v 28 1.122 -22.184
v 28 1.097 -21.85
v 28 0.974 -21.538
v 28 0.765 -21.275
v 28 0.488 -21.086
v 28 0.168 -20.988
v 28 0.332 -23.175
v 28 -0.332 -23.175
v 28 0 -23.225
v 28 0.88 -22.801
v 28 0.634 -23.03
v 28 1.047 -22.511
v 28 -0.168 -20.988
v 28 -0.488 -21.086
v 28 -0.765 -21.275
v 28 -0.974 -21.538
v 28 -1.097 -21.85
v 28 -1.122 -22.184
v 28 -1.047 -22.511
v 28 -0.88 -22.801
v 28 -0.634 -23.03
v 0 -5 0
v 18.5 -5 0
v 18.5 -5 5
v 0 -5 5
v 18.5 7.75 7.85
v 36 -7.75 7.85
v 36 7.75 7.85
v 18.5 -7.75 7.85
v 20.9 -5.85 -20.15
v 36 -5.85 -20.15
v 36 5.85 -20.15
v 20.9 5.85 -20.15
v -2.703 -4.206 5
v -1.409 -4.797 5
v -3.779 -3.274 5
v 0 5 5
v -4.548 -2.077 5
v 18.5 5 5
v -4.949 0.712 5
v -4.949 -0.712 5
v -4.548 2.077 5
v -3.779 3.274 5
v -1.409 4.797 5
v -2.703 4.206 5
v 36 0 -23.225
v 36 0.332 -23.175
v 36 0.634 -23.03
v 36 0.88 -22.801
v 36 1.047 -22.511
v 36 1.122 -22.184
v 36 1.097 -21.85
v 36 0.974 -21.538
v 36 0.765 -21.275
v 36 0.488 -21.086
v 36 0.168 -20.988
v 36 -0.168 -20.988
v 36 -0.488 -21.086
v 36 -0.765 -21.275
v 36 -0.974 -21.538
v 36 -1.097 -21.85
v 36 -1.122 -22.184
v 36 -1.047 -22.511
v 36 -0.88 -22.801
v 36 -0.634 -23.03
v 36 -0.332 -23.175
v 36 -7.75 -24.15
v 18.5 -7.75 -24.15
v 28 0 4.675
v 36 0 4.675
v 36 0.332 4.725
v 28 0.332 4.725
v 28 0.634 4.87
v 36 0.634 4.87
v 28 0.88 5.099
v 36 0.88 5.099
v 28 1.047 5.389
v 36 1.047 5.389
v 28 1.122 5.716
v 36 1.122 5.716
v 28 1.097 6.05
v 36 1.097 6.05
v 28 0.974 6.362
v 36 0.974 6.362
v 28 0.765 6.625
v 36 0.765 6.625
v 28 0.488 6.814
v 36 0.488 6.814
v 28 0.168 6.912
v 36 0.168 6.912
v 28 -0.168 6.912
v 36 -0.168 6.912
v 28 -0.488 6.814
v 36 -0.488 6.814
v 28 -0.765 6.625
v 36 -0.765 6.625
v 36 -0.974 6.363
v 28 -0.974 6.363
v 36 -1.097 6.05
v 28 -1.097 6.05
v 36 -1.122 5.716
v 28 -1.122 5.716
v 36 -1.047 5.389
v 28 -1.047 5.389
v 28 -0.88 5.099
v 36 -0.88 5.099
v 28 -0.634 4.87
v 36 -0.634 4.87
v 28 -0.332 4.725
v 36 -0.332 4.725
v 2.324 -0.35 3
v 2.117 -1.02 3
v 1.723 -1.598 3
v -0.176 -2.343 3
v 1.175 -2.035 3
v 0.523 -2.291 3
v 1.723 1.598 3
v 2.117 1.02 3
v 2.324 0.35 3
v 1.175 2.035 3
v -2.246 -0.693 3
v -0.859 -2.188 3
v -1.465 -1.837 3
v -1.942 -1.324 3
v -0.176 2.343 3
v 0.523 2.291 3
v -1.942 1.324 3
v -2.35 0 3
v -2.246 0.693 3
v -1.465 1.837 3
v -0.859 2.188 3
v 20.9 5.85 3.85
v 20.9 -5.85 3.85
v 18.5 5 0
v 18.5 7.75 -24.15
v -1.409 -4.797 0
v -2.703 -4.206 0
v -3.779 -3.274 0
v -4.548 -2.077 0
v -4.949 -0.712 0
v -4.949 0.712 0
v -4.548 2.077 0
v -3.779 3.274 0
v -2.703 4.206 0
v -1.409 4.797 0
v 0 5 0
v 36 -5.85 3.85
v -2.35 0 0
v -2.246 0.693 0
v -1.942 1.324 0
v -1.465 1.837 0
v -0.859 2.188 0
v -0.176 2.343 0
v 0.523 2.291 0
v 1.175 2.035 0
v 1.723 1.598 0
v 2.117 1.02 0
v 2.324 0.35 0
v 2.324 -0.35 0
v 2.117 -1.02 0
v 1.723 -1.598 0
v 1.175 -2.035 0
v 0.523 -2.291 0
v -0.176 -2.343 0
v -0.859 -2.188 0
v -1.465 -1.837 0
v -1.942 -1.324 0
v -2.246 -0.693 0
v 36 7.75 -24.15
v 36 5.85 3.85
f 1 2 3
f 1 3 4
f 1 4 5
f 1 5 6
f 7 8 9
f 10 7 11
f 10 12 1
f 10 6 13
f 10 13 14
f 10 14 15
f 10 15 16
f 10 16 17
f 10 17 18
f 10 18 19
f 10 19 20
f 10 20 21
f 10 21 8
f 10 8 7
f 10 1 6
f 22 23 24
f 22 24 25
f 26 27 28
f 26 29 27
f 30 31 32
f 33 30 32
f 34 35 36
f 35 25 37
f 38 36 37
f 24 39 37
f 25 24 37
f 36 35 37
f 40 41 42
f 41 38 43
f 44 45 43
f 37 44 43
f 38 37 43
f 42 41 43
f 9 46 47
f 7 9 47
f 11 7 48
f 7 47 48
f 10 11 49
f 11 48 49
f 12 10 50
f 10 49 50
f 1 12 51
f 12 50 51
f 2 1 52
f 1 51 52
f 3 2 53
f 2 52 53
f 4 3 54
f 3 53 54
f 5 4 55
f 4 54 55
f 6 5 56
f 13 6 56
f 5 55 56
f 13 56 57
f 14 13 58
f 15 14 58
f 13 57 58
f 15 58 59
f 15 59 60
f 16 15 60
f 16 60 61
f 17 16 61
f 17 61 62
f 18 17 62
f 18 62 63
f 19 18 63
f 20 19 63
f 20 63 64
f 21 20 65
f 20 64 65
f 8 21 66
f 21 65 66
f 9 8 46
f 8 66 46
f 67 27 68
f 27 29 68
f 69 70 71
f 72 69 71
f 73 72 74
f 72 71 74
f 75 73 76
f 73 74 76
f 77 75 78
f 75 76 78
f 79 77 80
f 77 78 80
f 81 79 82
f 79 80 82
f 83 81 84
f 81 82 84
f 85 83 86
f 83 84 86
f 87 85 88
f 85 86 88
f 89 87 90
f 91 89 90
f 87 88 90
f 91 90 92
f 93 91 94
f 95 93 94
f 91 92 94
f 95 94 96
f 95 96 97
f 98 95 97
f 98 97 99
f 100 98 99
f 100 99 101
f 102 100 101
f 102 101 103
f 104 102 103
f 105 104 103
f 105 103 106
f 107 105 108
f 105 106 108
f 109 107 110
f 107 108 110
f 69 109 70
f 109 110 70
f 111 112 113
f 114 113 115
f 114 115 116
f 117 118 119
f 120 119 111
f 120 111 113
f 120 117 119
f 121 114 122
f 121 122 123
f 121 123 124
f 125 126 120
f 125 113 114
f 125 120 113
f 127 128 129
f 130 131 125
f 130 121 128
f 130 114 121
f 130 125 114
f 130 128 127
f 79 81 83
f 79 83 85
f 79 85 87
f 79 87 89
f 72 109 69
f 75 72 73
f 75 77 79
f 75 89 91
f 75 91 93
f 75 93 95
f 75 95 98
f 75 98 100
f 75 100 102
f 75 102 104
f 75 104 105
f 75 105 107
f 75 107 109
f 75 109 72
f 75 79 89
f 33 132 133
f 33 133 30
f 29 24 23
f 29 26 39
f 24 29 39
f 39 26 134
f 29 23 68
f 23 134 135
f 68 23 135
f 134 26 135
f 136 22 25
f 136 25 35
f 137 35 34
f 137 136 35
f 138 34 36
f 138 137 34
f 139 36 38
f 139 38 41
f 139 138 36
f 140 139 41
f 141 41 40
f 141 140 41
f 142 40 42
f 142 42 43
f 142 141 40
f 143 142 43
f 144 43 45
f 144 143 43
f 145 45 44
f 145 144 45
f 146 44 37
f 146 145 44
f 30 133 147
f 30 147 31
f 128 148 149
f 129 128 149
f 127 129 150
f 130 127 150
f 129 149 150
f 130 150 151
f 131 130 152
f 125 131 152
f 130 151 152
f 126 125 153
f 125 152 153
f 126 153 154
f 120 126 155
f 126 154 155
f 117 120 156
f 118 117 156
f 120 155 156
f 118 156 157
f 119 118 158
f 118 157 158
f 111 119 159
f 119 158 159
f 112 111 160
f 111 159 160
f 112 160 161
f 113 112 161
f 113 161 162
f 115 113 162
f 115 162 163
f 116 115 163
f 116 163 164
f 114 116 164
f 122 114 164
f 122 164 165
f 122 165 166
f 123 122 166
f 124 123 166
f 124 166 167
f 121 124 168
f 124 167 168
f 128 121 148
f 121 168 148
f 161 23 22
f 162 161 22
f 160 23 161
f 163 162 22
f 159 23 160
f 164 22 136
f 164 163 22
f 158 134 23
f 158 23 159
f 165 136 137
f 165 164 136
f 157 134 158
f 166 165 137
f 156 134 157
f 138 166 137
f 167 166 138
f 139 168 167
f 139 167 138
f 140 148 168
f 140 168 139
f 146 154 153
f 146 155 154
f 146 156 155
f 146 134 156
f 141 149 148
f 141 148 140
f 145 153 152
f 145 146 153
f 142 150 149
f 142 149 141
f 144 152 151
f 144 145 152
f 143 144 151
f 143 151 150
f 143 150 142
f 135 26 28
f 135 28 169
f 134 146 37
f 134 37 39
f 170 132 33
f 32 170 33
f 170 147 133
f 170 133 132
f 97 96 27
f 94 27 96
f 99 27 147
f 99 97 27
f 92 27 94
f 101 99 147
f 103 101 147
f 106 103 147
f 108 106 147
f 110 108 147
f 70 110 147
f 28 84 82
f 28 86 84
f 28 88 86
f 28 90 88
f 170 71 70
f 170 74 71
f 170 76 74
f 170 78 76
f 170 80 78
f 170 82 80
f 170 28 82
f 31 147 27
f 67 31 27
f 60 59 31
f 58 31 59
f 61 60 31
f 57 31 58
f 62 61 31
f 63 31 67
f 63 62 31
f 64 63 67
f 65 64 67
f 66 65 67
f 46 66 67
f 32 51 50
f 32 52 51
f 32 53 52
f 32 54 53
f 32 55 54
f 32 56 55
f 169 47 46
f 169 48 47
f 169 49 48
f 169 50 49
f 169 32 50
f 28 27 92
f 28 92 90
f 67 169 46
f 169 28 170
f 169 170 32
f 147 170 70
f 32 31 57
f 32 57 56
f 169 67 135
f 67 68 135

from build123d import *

# Parameters (mm, degrees)
BOSS_EXTRUDE1_DEPTH = 5
SKETCH2_R           = 2.35
CUT_EXTRUDE1_DEPTH  = 3
SKETCH3_W           = 32
SKETCH3_H           = 15.5
SKETCH3_W_2         = 5
SKETCH3_H_2         = 10
BOSS_EXTRUDE2_DEPTH = 2.4
SKETCH4_W           = 32
SKETCH4_H           = 15.5
SKETCH4_W_2         = 24
SKETCH4_H_2         = 11.7
BOSS_EXTRUDE3_DEPTH = 15.1
SKETCH6_R           = 1.125
CUT_EXTRUDE2_DEPTH  = 8


with BuildPart() as part:
    # Sketch1 → Boss-Extrude1 (new body)
    with BuildSketch(Plane.XY):
        with BuildLine():
            Line((0, 5), (20.9, 5))
            Line((20.9, 5), (20.9, -5))
            Line((20.9, -5), (0, -5))
            ThreePointArc((0, -5), (-5, 0), (0, 5))
        make_face()
    extrude(amount=BOSS_EXTRUDE1_DEPTH)

    # Sketch2 → Cut-Extrude1 (cut)
    with BuildSketch(Plane(origin=(0, 0, 0), x_dir=(-1, 0, 0), z_dir=(0, 0, -1))):
        Circle(SKETCH2_R)
    extrude(amount=-CUT_EXTRUDE1_DEPTH, mode=Mode.SUBTRACT)

    # Sketch3 → Boss-Extrude2 (add)
    with BuildSketch(Plane(origin=(20.9, 0, 0), x_dir=(0, 0, -1), z_dir=(1, 0, 0))):
        with Locations((8.15, 0)):
            Rectangle(SKETCH3_W, SKETCH3_H)
        with Locations((-2.5, 0)):
            Rectangle(SKETCH3_W_2, SKETCH3_H_2, mode=Mode.SUBTRACT)
    extrude(amount=-BOSS_EXTRUDE2_DEPTH)

    # Sketch4 → Boss-Extrude3 (add)
    with BuildSketch(Plane(origin=(20.9, 0, 0), x_dir=(0, 0, -1), z_dir=(1, 0, 0))):
        with Locations((8.15, 0)):
            Rectangle(SKETCH4_W, SKETCH4_H)
        with Locations((8.15, 0)):
            Rectangle(SKETCH4_W_2, SKETCH4_H_2, mode=Mode.SUBTRACT)
    extrude(amount=BOSS_EXTRUDE3_DEPTH)

    # Sketch6 → Cut-Extrude2 (cut)
    with BuildSketch(Plane(origin=(36, 0, 0), x_dir=(0, 0, -1), z_dir=(1, 0, 0))):
        with Locations((-5.8, 0)):
            Circle(SKETCH6_R)
        with Locations((22.1, 0)):
            Circle(SKETCH6_R)
    extrude(amount=-CUT_EXTRUDE2_DEPTH, mode=Mode.SUBTRACT)


solid = part.part
